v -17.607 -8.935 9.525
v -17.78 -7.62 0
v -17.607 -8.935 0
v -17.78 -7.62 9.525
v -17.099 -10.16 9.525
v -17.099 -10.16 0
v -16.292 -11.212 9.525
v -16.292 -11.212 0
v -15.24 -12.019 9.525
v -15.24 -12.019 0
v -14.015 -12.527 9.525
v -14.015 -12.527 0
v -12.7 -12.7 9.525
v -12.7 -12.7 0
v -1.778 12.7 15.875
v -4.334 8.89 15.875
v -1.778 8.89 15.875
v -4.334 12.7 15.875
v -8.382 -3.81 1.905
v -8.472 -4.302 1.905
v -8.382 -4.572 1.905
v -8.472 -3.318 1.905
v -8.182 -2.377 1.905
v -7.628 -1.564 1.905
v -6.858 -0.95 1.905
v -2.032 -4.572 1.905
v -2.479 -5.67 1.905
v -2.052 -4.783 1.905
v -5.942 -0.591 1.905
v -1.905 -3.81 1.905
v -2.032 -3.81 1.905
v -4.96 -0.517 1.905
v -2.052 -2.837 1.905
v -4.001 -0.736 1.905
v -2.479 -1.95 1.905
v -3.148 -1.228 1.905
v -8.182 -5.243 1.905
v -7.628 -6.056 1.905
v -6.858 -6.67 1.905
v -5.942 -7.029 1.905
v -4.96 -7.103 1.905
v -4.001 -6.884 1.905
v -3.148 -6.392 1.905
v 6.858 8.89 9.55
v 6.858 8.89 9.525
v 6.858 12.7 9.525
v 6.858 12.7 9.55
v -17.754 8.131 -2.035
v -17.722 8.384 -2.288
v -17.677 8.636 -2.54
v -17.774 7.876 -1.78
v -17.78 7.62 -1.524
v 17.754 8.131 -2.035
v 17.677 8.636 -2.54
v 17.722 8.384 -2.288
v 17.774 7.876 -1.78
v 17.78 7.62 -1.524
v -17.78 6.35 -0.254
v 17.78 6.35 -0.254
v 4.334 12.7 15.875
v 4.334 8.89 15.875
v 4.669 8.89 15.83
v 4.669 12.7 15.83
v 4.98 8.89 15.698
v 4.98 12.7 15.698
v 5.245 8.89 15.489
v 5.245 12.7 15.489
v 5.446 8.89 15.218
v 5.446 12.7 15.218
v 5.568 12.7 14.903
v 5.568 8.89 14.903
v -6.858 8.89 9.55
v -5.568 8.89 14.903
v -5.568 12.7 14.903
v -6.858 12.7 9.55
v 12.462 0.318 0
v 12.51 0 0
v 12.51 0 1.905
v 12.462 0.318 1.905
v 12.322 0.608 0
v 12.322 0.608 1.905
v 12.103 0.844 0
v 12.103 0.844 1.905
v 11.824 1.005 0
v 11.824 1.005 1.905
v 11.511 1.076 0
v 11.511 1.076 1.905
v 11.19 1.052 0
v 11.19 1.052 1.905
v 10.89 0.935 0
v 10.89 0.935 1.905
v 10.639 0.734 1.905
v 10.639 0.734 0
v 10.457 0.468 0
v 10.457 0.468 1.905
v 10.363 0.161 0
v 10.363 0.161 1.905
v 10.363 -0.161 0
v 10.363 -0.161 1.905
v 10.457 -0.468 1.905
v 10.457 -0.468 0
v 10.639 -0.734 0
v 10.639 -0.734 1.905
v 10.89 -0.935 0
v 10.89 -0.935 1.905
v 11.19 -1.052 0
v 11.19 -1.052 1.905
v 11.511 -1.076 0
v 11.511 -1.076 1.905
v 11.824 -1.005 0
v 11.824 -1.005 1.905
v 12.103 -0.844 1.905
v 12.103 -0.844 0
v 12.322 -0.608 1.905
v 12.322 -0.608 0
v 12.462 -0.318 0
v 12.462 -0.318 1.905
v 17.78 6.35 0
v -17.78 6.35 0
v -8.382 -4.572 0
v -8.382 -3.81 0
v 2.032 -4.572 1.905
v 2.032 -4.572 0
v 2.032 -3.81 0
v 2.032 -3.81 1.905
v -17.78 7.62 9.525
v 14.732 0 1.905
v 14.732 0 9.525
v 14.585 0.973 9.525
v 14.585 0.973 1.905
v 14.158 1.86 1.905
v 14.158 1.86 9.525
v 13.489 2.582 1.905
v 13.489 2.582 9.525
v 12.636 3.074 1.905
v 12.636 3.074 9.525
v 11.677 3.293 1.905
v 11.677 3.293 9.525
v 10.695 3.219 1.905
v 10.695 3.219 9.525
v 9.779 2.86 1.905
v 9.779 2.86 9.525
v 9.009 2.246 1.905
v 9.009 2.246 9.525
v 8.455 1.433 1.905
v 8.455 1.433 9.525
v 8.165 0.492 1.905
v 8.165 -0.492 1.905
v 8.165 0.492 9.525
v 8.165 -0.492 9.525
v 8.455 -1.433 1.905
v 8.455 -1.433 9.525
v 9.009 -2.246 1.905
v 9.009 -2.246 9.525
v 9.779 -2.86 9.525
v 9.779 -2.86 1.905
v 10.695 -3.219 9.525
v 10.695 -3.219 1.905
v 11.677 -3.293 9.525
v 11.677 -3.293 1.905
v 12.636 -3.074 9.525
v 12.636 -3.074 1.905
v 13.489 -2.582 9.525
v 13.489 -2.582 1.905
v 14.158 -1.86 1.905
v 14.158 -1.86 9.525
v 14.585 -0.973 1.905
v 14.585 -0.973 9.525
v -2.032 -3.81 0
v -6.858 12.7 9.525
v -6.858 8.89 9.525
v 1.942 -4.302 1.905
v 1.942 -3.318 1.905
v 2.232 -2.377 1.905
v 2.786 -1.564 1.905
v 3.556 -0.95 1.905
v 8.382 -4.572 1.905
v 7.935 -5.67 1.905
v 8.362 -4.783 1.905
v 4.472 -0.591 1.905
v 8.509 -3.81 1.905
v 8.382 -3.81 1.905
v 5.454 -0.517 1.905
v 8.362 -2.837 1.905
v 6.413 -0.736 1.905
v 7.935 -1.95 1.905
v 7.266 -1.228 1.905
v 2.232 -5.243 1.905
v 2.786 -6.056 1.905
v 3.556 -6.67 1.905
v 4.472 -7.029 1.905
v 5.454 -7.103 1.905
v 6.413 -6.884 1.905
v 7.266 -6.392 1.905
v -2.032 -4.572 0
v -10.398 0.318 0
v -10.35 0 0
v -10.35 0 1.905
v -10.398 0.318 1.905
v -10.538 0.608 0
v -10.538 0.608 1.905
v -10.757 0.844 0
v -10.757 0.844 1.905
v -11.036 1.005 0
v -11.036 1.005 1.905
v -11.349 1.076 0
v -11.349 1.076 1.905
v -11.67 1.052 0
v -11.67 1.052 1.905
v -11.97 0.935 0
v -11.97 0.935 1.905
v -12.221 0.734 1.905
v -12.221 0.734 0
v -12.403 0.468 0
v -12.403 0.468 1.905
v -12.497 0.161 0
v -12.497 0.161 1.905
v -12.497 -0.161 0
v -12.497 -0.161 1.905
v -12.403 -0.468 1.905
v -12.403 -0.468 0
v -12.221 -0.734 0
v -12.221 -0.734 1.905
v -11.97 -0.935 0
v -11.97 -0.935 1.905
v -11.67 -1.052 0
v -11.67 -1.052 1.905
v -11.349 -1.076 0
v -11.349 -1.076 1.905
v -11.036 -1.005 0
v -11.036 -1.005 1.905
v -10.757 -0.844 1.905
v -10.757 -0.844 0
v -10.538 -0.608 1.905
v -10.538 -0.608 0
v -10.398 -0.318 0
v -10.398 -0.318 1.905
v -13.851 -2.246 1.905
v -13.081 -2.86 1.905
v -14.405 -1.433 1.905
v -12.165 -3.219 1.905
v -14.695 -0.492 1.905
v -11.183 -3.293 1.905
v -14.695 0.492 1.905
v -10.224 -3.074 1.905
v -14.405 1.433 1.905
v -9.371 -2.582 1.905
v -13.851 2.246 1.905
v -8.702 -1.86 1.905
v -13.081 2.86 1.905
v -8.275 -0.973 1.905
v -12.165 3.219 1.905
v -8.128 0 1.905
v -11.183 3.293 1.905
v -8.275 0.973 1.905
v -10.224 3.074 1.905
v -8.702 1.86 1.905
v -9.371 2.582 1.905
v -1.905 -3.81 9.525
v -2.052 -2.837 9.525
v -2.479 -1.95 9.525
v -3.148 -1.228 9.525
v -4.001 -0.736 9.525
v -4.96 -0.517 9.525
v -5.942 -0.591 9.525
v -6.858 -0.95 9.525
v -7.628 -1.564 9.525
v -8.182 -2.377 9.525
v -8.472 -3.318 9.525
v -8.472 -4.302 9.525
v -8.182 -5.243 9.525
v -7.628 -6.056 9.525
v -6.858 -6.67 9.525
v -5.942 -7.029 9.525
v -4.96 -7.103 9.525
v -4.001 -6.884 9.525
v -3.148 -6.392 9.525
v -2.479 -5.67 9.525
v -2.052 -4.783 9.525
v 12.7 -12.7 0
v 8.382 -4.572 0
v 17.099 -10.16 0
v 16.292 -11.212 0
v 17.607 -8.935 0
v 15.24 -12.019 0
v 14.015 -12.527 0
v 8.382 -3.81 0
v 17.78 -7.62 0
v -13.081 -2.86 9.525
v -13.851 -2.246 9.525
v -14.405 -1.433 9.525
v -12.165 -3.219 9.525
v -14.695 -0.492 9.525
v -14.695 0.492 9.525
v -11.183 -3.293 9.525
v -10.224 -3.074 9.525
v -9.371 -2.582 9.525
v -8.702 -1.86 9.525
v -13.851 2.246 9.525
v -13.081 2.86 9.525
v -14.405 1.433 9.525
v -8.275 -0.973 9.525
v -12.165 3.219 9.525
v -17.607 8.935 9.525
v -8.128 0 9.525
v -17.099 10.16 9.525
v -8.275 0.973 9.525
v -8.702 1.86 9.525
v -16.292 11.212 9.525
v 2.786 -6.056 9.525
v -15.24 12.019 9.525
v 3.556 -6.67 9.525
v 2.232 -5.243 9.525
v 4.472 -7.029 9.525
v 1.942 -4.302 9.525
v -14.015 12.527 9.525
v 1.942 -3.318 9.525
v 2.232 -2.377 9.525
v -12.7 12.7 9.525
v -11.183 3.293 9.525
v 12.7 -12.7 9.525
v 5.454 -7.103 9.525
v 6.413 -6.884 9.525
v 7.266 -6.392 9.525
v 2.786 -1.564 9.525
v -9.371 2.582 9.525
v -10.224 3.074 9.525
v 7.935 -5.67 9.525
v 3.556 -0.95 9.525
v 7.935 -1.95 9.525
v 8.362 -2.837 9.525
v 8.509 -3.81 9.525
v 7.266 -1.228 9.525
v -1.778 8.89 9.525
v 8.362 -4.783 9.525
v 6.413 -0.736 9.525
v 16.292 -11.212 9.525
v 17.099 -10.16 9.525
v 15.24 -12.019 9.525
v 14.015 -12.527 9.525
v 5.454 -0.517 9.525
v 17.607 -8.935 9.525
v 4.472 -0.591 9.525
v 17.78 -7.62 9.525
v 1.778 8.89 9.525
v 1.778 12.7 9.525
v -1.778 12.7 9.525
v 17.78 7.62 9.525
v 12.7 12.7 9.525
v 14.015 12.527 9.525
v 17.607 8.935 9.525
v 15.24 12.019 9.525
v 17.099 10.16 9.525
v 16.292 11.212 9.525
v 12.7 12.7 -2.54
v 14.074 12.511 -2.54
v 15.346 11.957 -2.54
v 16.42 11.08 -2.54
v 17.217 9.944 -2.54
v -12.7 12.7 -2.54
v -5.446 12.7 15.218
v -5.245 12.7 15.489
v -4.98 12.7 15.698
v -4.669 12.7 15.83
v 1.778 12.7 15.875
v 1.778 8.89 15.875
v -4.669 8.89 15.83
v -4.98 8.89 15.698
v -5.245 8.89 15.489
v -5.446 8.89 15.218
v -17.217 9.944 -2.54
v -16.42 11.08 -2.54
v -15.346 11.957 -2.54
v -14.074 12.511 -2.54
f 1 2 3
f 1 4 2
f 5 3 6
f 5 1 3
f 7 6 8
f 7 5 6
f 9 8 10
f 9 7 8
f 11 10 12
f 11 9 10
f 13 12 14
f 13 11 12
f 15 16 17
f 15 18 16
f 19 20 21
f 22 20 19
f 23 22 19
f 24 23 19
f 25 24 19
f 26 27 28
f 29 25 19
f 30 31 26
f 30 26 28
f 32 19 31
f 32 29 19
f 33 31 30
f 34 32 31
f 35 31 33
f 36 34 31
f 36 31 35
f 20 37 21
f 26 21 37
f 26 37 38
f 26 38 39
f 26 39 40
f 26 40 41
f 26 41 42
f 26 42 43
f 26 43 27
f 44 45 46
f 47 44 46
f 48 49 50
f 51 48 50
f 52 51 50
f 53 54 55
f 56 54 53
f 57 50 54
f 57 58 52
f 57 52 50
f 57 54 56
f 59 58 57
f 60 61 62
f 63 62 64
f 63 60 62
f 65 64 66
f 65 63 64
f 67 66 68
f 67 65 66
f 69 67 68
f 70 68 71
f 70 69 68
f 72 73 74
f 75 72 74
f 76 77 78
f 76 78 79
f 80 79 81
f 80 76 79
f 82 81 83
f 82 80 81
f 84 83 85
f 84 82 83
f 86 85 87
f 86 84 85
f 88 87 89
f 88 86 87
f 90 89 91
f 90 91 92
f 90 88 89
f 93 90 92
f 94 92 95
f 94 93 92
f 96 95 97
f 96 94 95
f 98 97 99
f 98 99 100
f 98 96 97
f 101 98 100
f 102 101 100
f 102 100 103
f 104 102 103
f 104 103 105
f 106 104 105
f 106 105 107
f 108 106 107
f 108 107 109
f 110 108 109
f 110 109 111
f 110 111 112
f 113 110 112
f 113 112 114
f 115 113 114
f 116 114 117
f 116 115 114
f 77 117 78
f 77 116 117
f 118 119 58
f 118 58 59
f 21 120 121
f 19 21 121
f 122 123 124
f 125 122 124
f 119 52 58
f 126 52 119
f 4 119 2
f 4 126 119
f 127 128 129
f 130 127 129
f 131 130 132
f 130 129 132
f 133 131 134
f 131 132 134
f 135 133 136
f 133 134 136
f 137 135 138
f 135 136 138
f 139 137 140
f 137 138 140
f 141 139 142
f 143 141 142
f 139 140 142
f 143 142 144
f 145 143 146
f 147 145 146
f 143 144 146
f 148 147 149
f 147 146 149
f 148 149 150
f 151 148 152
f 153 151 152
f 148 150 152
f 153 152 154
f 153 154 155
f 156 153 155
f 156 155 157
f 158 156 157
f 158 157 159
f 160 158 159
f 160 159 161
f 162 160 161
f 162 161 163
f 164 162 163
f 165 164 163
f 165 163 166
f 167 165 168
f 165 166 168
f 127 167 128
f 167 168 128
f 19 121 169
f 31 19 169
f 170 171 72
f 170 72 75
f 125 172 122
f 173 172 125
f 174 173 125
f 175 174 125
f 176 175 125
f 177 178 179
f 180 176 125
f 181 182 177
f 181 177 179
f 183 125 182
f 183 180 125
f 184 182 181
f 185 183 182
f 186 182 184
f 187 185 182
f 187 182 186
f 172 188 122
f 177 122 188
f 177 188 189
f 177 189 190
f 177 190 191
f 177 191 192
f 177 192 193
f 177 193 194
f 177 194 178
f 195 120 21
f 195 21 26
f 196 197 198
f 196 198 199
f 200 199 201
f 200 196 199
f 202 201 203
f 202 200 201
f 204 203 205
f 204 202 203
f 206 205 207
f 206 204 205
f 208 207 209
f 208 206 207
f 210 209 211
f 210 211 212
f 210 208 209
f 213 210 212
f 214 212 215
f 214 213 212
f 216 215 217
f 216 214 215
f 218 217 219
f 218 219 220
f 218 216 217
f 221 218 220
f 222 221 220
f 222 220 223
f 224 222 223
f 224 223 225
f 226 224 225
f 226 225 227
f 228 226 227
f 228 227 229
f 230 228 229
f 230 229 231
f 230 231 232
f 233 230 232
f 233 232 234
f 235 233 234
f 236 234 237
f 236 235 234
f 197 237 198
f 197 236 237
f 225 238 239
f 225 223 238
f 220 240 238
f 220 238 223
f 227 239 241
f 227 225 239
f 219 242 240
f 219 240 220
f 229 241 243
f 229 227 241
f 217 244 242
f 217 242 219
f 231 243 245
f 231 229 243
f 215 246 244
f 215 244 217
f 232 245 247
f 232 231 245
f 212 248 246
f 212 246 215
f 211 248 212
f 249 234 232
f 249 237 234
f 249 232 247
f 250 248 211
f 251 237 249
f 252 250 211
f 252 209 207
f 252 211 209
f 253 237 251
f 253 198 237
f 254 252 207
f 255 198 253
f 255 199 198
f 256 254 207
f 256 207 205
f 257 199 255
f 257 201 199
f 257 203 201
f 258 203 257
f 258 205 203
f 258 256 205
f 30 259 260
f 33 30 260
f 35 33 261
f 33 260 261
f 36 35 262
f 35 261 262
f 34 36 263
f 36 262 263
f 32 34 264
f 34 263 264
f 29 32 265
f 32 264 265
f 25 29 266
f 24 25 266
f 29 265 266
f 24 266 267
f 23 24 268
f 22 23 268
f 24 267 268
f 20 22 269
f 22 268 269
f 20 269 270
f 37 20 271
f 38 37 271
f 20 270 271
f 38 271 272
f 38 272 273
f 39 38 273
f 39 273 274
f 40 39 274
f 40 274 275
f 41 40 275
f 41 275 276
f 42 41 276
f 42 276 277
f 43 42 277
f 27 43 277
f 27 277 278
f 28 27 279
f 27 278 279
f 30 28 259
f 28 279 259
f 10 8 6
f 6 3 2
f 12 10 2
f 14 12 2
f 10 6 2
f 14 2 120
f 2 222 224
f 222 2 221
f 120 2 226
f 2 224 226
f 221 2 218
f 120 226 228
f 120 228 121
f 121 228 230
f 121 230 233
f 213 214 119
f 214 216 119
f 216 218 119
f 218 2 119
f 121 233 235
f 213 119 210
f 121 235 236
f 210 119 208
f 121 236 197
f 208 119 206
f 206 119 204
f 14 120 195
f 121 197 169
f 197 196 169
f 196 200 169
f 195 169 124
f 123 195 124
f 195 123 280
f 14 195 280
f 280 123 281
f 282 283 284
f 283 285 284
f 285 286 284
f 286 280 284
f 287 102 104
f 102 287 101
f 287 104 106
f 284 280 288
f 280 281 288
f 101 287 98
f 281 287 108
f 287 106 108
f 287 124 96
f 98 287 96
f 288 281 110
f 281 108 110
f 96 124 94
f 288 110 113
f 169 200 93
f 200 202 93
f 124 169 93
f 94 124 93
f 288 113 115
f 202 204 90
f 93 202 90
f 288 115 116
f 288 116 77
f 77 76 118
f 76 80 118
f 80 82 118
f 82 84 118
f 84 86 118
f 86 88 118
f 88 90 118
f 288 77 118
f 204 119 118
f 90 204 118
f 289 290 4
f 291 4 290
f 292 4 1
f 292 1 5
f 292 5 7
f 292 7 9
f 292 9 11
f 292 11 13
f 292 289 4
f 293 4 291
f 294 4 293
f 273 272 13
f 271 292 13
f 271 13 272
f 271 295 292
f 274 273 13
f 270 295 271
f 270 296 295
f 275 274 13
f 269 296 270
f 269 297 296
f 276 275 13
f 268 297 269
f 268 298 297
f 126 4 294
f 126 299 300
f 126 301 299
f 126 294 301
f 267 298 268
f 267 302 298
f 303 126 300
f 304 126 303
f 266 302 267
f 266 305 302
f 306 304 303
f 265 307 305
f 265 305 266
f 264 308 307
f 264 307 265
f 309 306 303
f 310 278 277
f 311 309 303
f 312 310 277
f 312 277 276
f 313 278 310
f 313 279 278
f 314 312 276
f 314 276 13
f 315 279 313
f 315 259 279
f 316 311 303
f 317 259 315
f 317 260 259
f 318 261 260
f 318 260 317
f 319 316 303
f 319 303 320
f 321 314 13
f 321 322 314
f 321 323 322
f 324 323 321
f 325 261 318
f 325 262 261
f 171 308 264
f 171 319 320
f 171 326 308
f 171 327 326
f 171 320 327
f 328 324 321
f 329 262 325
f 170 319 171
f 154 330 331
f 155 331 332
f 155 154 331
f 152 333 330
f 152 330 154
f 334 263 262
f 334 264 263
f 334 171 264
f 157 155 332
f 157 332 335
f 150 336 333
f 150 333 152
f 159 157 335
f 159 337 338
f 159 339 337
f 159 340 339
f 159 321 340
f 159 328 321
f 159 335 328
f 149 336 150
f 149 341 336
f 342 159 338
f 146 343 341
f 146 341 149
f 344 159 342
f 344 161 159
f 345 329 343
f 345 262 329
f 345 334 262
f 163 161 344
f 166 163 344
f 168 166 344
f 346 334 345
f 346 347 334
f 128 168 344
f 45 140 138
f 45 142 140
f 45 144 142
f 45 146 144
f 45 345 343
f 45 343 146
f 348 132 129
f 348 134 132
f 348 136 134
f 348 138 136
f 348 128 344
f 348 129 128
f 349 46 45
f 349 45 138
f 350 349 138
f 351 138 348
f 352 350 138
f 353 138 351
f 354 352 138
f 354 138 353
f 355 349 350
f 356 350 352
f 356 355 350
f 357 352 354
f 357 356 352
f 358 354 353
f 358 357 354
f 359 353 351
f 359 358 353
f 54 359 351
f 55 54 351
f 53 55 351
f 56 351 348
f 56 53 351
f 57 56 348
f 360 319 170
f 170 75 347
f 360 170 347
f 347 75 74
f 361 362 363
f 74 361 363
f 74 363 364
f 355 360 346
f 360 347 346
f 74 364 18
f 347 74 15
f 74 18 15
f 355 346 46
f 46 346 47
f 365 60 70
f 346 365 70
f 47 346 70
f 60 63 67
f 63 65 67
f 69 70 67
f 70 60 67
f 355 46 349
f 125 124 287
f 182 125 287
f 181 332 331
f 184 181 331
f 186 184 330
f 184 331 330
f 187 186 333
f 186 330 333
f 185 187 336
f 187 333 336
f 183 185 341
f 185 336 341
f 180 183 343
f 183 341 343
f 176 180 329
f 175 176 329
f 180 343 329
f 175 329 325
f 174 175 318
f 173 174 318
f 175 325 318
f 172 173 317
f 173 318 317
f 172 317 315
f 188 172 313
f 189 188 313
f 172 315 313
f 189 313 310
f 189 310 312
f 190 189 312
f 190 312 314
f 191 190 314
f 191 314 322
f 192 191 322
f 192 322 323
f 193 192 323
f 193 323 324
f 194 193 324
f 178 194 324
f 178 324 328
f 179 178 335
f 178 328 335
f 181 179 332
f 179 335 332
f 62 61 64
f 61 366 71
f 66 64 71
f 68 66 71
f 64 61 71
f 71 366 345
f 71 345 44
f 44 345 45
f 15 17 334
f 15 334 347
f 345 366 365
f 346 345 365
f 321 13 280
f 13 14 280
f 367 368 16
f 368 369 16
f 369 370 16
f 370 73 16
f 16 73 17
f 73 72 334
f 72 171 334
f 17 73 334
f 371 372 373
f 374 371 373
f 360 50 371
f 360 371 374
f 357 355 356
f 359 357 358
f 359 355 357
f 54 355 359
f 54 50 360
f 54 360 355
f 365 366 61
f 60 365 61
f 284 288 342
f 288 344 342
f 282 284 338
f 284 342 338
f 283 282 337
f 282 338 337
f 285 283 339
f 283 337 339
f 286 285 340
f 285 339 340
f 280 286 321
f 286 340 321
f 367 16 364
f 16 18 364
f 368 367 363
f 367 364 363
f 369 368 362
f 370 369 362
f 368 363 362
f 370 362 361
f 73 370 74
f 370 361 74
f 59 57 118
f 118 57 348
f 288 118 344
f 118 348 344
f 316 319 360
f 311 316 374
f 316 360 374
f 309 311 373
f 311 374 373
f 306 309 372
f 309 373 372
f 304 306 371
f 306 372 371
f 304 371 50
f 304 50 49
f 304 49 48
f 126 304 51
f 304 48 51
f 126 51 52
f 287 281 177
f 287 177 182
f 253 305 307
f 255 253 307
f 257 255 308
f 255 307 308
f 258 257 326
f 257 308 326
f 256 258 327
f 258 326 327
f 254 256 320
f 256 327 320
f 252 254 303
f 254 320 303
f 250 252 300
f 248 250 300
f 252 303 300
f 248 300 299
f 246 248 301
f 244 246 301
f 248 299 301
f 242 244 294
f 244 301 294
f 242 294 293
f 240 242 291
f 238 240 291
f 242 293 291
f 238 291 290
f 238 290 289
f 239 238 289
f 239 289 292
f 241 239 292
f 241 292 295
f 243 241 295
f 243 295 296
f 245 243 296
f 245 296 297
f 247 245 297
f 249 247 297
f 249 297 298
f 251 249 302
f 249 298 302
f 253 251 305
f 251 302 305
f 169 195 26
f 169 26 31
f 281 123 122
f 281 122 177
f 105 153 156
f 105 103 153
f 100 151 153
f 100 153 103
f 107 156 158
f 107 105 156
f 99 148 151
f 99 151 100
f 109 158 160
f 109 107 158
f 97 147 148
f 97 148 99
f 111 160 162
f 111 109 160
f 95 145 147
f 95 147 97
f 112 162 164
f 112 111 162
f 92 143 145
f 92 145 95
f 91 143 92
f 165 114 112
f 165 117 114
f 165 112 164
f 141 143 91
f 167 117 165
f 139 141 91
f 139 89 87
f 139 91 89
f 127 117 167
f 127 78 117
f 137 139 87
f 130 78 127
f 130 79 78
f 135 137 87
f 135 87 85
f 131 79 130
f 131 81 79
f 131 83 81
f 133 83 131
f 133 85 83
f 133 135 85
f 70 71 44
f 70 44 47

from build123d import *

# Parameters (mm, degrees)
SKETCH_W        = 35.56
SKETCH_H        = 25.4
SKETCH_R        = 1.0795
SKETCH_W_2      = 6.35
SKETCH_H_2      = 0.762
PAD_DEPTH       = 1.905
SKETCH001_W     = 35.56
SKETCH001_H     = 25.4
PAD001_DEPTH    = 7.62
SKETCH002_R     = 3.302
POCKET_DEPTH    = 7.62
SKETCH003_W     = 35.56
SKETCH003_H     = 6.35
PAD002_DEPTH    = 2.54
SKETCH004_W     = 5.08
SKETCH004_H     = 3.81
PAD003_DEPTH    = 6.35
CHAMFER_1_SIZE2 = 1.524
CHAMFER_1_SIZE  = 6.3246
CHAMFER_2_SIZE2 = 1.524
CHAMFER_2_SIZE  = 6.3246
FILLET_R        = 1.27
FILLET001_R     = 5.08
CHAMFER001_SIZE = 2.286


with BuildPart() as part:
    # Sketch → Pad (new body)
    with BuildSketch(Plane.XY):
        Rectangle(SKETCH_W, SKETCH_H)
        with Locations((-11.43, 0)):
            Circle(SKETCH_R, mode=Mode.SUBTRACT)
        with Locations((11.43, 0)):
            Circle(SKETCH_R, mode=Mode.SUBTRACT)
        with Locations((5.207, -4.191)):
            Rectangle(SKETCH_W_2, SKETCH_H_2, mode=Mode.SUBTRACT)
        with Locations((-5.207, -4.191)):
            Rectangle(SKETCH_W_2, SKETCH_H_2, mode=Mode.SUBTRACT)
    extrude(amount=PAD_DEPTH)

    # Sketch001 (on Face16 of Pad) → Pad001 (join)
    with BuildSketch(Plane.XY.offset(1.905)):
        Rectangle(SKETCH001_W, SKETCH001_H)
    extrude(amount=PAD001_DEPTH)

    # Sketch002 (on Face17 of Pad001) → Pocket (cut)
    with BuildSketch(Plane.XY.offset(9.525)):
        with Locations((-5.207, -3.81)):
            Circle(SKETCH002_R)
        with Locations((5.207, -3.81)):
            Circle(SKETCH002_R)
        with Locations((11.43, 0)):
            Circle(SKETCH002_R)
        with Locations((-11.43, 0)):
            Circle(SKETCH002_R)
    extrude(amount=-POCKET_DEPTH, mode=Mode.SUBTRACT)

    # Sketch003 (on Face1 of Pocket) → Pad002 (join)
    with BuildSketch(Plane(origin=(0, 0, 0), x_dir=(1, 0, 0), z_dir=(0, 0, -1))):
        with Locations((0, -9.525)):
            Rectangle(SKETCH003_W, SKETCH003_H)
    extrude(amount=PAD002_DEPTH)

    # Sketch004 (on Face15 of Pad002) → Pad003 (join)
    with BuildSketch(Plane.XY.offset(9.525)):
        with Locations((-4.318, 10.795)):
            Rectangle(SKETCH004_W, SKETCH004_H)
        with Locations((4.318, 10.795)):
            Rectangle(SKETCH004_W, SKETCH004_H)
    extrude(amount=PAD003_DEPTH)

    # Chamfer 1
    chamfer_1_edges = [part.edges().sort_by_distance(p)[0] for p in [
        (-6.858, 10.795, 15.875),
    ]]
    chamfer_1_side = part.faces().sort_by_distance((-6.858, 10.795, 12.7))[0]
    chamfer(chamfer_1_edges, length=CHAMFER_1_SIZE, length2=CHAMFER_1_SIZE2, reference=chamfer_1_side)

    # Chamfer 2
    chamfer_2_edges = [part.edges().sort_by_distance(p)[0] for p in [
        (6.858, 10.795, 15.875),
    ]]
    chamfer_2_side = part.faces().sort_by_distance((6.858, 10.795, 12.7))[0]
    chamfer(chamfer_2_edges, length=CHAMFER_2_SIZE, length2=CHAMFER_2_SIZE2, reference=chamfer_2_side)

    # Fillet
    fillet_edges = [part.edges().sort_by_distance(p)[0] for p in [
        (-5.334, 10.795, 15.875),
        (5.334, 10.795, 15.875),
    ]]
    fillet(fillet_edges, radius=FILLET_R)

    # Fillet001
    fillet001_edges = [part.edges().sort_by_distance(p)[0] for p in [
        (-17.78, -12.7, 4.7625),
        (-17.78, 12.7, 3.4925),
        (17.78, -12.7, 4.7625),
        (17.78, 12.7, 3.4925),
    ]]
    fillet(fillet001_edges, radius=FILLET001_R)

    # Chamfer001
    chamfer001_edges = [part.edges().sort_by_distance(p)[0] for p in [
        (0, 6.35, -2.54),
    ]]
    chamfer(chamfer001_edges, length=CHAMFER001_SIZE)


solid = part.part
